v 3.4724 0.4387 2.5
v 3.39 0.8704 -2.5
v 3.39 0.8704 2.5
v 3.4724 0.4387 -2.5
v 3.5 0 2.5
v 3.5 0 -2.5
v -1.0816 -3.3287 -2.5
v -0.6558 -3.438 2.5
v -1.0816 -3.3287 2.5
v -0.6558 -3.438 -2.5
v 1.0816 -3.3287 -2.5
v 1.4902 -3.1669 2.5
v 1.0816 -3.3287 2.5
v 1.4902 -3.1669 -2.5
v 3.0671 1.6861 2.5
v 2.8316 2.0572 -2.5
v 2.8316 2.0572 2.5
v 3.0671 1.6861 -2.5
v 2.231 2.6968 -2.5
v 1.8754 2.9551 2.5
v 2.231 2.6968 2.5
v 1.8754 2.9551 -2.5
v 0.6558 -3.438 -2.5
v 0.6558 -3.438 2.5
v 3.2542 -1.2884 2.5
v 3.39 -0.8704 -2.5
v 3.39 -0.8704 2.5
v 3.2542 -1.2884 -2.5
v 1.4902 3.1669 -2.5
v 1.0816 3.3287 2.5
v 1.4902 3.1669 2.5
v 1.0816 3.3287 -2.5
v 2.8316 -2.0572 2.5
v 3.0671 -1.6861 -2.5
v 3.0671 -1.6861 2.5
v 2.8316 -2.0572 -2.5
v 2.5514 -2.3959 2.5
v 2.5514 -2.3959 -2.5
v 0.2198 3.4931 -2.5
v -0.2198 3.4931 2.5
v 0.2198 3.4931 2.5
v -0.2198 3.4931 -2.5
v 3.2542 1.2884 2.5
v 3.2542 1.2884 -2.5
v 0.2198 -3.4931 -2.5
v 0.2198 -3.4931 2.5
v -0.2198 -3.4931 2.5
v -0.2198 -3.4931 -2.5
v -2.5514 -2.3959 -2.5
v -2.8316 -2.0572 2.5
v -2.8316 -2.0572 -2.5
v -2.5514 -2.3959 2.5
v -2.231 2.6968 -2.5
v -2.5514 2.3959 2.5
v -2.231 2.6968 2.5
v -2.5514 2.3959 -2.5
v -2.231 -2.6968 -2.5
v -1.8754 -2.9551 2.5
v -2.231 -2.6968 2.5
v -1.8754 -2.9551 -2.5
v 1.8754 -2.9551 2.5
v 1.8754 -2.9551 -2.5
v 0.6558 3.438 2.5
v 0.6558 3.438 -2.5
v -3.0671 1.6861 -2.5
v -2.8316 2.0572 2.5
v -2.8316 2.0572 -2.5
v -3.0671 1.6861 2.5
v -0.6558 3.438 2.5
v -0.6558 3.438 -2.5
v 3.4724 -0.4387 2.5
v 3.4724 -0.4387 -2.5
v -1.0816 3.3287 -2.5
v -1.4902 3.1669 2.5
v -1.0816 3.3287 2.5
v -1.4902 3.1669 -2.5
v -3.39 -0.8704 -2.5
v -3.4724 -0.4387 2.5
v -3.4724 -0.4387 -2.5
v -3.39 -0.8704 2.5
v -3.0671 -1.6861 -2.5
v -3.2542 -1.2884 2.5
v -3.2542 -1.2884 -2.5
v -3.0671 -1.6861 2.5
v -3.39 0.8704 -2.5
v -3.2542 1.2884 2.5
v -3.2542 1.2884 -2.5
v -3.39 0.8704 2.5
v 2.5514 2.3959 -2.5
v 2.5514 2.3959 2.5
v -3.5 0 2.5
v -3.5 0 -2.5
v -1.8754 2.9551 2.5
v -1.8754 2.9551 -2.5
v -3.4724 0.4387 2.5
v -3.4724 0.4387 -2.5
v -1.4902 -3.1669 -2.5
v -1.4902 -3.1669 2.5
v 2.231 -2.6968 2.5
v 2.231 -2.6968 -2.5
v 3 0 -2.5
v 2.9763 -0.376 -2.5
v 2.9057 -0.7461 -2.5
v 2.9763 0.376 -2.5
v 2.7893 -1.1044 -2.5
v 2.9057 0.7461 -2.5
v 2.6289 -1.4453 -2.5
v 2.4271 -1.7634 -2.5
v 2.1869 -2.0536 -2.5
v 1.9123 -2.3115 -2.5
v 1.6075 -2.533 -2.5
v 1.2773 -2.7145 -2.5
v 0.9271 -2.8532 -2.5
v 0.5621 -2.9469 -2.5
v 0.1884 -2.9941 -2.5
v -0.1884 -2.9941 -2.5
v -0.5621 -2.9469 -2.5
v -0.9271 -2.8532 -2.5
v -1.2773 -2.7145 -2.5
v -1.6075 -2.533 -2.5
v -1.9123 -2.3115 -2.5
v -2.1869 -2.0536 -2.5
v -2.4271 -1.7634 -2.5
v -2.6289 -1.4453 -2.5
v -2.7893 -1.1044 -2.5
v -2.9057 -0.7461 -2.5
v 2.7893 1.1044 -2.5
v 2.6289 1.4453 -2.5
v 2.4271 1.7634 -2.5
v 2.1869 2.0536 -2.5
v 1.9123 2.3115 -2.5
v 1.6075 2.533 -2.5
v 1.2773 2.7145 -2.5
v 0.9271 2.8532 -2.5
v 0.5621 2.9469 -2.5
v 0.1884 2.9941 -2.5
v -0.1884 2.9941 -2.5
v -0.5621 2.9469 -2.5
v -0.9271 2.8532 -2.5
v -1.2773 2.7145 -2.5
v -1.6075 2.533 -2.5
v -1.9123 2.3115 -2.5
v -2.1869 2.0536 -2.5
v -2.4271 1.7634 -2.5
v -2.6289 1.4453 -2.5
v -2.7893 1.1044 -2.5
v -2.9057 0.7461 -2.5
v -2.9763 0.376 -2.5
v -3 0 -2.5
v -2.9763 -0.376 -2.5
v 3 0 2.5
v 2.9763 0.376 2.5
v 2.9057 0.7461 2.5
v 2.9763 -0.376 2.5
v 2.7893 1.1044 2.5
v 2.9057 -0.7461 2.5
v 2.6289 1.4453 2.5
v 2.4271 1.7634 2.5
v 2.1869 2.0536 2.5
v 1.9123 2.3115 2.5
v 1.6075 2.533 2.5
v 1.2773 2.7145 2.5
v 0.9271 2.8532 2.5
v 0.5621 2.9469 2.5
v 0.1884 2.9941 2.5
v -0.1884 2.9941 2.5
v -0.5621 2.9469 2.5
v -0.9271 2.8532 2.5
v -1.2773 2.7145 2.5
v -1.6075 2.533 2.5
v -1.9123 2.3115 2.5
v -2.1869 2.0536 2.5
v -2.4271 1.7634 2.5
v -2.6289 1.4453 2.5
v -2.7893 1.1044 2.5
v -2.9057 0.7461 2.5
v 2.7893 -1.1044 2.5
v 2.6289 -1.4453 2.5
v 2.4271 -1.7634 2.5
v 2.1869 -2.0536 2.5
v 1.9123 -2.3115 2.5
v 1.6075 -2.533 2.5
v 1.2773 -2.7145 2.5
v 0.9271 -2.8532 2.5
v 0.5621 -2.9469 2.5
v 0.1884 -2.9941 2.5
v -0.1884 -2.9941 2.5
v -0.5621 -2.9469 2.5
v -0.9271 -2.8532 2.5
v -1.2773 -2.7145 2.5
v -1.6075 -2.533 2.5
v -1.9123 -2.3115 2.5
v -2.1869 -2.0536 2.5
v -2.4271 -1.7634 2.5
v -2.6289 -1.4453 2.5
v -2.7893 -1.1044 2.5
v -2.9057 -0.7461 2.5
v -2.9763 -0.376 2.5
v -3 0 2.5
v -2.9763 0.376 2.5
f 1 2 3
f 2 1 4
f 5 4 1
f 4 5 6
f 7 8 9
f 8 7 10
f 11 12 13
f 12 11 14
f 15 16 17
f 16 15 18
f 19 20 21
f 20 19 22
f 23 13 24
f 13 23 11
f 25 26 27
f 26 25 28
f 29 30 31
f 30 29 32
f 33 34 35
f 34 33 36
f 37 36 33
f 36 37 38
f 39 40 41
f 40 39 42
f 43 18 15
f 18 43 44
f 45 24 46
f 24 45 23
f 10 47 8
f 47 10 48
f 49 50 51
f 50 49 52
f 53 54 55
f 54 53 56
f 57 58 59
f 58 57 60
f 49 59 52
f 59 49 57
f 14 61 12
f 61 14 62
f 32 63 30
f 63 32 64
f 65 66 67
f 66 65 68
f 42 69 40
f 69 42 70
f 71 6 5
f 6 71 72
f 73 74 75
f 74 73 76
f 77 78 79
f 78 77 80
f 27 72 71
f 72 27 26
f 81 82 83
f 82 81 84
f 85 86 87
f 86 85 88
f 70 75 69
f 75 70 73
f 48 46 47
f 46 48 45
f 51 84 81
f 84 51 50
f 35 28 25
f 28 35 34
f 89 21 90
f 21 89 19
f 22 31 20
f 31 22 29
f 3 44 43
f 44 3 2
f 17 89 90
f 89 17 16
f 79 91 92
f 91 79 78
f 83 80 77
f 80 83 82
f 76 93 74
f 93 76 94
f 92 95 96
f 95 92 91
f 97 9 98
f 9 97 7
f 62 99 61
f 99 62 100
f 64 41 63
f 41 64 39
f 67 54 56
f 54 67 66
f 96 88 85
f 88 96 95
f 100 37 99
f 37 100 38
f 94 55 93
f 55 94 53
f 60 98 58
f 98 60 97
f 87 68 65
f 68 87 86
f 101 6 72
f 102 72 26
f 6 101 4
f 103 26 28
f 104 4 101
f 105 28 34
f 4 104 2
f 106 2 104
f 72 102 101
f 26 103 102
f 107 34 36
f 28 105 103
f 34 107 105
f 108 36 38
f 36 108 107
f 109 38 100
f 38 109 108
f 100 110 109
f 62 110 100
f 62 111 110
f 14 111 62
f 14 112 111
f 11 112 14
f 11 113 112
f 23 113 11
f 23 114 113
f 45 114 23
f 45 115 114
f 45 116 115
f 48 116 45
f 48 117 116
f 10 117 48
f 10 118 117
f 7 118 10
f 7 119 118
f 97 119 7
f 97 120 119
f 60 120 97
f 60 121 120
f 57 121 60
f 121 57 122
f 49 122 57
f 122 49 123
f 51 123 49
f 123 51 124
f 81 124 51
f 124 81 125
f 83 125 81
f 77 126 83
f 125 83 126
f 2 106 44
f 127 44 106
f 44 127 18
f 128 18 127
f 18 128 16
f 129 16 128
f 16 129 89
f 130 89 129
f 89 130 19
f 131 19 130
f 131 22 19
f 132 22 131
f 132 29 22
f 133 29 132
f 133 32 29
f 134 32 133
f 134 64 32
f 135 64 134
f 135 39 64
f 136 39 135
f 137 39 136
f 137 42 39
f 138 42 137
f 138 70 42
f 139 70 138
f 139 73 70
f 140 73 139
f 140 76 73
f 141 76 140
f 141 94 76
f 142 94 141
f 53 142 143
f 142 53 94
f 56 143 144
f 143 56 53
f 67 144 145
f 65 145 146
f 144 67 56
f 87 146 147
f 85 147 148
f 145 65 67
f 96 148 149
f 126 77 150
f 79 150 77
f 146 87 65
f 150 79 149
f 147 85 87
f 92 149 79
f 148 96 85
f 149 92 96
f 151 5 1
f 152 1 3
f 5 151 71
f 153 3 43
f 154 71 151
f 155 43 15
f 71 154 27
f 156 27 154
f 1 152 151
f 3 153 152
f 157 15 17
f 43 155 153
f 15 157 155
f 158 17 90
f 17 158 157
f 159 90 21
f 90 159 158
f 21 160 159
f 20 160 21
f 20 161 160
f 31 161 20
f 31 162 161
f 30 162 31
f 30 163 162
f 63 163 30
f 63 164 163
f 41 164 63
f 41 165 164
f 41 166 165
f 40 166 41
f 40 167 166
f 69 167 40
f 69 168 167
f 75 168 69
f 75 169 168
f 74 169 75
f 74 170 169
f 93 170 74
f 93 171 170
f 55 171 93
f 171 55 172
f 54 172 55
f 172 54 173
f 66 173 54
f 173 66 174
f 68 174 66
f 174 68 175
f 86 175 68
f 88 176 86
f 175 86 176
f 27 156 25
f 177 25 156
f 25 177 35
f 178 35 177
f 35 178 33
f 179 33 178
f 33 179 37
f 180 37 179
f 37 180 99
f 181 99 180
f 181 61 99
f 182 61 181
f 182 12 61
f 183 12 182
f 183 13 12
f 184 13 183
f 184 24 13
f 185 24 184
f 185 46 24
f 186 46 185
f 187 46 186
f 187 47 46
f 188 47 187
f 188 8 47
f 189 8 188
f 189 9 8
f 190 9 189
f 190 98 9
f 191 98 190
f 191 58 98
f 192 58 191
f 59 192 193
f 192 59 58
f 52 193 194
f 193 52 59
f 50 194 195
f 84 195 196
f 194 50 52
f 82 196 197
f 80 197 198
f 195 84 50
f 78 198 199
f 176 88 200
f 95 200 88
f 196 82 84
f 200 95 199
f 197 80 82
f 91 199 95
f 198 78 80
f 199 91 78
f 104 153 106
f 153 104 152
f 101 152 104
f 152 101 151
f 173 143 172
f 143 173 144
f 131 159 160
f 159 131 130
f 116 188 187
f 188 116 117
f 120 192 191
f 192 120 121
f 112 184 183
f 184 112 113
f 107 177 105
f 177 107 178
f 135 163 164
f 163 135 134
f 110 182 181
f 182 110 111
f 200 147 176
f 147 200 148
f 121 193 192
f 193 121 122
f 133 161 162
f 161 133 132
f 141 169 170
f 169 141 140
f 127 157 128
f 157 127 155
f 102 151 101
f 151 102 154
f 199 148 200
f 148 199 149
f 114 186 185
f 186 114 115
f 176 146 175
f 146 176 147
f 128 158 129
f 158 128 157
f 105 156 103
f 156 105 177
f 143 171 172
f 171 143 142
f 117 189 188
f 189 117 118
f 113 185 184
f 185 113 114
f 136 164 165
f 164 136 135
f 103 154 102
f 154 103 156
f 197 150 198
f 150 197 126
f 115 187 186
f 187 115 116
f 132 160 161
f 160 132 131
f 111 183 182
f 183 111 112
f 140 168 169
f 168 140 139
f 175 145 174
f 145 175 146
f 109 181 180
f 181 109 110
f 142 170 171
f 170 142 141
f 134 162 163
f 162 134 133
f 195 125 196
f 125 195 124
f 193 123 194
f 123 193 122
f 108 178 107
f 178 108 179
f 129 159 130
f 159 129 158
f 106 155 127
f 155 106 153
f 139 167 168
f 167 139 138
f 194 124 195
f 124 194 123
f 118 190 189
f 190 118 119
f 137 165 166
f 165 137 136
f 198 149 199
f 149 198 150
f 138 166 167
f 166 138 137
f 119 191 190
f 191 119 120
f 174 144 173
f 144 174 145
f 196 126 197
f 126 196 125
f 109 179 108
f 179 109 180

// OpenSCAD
$fn = 50;


difference() {
	union() {
		translate(v = [0, 0, -2.5000000000]) {
			cylinder(h = 5, r = 3.5000000000);
		}
	}
	union() {
		translate(v = [0, 0, -100.0000000000]) {
			cylinder(h = 200, r = 3.0000000000);
		}
	}
}
